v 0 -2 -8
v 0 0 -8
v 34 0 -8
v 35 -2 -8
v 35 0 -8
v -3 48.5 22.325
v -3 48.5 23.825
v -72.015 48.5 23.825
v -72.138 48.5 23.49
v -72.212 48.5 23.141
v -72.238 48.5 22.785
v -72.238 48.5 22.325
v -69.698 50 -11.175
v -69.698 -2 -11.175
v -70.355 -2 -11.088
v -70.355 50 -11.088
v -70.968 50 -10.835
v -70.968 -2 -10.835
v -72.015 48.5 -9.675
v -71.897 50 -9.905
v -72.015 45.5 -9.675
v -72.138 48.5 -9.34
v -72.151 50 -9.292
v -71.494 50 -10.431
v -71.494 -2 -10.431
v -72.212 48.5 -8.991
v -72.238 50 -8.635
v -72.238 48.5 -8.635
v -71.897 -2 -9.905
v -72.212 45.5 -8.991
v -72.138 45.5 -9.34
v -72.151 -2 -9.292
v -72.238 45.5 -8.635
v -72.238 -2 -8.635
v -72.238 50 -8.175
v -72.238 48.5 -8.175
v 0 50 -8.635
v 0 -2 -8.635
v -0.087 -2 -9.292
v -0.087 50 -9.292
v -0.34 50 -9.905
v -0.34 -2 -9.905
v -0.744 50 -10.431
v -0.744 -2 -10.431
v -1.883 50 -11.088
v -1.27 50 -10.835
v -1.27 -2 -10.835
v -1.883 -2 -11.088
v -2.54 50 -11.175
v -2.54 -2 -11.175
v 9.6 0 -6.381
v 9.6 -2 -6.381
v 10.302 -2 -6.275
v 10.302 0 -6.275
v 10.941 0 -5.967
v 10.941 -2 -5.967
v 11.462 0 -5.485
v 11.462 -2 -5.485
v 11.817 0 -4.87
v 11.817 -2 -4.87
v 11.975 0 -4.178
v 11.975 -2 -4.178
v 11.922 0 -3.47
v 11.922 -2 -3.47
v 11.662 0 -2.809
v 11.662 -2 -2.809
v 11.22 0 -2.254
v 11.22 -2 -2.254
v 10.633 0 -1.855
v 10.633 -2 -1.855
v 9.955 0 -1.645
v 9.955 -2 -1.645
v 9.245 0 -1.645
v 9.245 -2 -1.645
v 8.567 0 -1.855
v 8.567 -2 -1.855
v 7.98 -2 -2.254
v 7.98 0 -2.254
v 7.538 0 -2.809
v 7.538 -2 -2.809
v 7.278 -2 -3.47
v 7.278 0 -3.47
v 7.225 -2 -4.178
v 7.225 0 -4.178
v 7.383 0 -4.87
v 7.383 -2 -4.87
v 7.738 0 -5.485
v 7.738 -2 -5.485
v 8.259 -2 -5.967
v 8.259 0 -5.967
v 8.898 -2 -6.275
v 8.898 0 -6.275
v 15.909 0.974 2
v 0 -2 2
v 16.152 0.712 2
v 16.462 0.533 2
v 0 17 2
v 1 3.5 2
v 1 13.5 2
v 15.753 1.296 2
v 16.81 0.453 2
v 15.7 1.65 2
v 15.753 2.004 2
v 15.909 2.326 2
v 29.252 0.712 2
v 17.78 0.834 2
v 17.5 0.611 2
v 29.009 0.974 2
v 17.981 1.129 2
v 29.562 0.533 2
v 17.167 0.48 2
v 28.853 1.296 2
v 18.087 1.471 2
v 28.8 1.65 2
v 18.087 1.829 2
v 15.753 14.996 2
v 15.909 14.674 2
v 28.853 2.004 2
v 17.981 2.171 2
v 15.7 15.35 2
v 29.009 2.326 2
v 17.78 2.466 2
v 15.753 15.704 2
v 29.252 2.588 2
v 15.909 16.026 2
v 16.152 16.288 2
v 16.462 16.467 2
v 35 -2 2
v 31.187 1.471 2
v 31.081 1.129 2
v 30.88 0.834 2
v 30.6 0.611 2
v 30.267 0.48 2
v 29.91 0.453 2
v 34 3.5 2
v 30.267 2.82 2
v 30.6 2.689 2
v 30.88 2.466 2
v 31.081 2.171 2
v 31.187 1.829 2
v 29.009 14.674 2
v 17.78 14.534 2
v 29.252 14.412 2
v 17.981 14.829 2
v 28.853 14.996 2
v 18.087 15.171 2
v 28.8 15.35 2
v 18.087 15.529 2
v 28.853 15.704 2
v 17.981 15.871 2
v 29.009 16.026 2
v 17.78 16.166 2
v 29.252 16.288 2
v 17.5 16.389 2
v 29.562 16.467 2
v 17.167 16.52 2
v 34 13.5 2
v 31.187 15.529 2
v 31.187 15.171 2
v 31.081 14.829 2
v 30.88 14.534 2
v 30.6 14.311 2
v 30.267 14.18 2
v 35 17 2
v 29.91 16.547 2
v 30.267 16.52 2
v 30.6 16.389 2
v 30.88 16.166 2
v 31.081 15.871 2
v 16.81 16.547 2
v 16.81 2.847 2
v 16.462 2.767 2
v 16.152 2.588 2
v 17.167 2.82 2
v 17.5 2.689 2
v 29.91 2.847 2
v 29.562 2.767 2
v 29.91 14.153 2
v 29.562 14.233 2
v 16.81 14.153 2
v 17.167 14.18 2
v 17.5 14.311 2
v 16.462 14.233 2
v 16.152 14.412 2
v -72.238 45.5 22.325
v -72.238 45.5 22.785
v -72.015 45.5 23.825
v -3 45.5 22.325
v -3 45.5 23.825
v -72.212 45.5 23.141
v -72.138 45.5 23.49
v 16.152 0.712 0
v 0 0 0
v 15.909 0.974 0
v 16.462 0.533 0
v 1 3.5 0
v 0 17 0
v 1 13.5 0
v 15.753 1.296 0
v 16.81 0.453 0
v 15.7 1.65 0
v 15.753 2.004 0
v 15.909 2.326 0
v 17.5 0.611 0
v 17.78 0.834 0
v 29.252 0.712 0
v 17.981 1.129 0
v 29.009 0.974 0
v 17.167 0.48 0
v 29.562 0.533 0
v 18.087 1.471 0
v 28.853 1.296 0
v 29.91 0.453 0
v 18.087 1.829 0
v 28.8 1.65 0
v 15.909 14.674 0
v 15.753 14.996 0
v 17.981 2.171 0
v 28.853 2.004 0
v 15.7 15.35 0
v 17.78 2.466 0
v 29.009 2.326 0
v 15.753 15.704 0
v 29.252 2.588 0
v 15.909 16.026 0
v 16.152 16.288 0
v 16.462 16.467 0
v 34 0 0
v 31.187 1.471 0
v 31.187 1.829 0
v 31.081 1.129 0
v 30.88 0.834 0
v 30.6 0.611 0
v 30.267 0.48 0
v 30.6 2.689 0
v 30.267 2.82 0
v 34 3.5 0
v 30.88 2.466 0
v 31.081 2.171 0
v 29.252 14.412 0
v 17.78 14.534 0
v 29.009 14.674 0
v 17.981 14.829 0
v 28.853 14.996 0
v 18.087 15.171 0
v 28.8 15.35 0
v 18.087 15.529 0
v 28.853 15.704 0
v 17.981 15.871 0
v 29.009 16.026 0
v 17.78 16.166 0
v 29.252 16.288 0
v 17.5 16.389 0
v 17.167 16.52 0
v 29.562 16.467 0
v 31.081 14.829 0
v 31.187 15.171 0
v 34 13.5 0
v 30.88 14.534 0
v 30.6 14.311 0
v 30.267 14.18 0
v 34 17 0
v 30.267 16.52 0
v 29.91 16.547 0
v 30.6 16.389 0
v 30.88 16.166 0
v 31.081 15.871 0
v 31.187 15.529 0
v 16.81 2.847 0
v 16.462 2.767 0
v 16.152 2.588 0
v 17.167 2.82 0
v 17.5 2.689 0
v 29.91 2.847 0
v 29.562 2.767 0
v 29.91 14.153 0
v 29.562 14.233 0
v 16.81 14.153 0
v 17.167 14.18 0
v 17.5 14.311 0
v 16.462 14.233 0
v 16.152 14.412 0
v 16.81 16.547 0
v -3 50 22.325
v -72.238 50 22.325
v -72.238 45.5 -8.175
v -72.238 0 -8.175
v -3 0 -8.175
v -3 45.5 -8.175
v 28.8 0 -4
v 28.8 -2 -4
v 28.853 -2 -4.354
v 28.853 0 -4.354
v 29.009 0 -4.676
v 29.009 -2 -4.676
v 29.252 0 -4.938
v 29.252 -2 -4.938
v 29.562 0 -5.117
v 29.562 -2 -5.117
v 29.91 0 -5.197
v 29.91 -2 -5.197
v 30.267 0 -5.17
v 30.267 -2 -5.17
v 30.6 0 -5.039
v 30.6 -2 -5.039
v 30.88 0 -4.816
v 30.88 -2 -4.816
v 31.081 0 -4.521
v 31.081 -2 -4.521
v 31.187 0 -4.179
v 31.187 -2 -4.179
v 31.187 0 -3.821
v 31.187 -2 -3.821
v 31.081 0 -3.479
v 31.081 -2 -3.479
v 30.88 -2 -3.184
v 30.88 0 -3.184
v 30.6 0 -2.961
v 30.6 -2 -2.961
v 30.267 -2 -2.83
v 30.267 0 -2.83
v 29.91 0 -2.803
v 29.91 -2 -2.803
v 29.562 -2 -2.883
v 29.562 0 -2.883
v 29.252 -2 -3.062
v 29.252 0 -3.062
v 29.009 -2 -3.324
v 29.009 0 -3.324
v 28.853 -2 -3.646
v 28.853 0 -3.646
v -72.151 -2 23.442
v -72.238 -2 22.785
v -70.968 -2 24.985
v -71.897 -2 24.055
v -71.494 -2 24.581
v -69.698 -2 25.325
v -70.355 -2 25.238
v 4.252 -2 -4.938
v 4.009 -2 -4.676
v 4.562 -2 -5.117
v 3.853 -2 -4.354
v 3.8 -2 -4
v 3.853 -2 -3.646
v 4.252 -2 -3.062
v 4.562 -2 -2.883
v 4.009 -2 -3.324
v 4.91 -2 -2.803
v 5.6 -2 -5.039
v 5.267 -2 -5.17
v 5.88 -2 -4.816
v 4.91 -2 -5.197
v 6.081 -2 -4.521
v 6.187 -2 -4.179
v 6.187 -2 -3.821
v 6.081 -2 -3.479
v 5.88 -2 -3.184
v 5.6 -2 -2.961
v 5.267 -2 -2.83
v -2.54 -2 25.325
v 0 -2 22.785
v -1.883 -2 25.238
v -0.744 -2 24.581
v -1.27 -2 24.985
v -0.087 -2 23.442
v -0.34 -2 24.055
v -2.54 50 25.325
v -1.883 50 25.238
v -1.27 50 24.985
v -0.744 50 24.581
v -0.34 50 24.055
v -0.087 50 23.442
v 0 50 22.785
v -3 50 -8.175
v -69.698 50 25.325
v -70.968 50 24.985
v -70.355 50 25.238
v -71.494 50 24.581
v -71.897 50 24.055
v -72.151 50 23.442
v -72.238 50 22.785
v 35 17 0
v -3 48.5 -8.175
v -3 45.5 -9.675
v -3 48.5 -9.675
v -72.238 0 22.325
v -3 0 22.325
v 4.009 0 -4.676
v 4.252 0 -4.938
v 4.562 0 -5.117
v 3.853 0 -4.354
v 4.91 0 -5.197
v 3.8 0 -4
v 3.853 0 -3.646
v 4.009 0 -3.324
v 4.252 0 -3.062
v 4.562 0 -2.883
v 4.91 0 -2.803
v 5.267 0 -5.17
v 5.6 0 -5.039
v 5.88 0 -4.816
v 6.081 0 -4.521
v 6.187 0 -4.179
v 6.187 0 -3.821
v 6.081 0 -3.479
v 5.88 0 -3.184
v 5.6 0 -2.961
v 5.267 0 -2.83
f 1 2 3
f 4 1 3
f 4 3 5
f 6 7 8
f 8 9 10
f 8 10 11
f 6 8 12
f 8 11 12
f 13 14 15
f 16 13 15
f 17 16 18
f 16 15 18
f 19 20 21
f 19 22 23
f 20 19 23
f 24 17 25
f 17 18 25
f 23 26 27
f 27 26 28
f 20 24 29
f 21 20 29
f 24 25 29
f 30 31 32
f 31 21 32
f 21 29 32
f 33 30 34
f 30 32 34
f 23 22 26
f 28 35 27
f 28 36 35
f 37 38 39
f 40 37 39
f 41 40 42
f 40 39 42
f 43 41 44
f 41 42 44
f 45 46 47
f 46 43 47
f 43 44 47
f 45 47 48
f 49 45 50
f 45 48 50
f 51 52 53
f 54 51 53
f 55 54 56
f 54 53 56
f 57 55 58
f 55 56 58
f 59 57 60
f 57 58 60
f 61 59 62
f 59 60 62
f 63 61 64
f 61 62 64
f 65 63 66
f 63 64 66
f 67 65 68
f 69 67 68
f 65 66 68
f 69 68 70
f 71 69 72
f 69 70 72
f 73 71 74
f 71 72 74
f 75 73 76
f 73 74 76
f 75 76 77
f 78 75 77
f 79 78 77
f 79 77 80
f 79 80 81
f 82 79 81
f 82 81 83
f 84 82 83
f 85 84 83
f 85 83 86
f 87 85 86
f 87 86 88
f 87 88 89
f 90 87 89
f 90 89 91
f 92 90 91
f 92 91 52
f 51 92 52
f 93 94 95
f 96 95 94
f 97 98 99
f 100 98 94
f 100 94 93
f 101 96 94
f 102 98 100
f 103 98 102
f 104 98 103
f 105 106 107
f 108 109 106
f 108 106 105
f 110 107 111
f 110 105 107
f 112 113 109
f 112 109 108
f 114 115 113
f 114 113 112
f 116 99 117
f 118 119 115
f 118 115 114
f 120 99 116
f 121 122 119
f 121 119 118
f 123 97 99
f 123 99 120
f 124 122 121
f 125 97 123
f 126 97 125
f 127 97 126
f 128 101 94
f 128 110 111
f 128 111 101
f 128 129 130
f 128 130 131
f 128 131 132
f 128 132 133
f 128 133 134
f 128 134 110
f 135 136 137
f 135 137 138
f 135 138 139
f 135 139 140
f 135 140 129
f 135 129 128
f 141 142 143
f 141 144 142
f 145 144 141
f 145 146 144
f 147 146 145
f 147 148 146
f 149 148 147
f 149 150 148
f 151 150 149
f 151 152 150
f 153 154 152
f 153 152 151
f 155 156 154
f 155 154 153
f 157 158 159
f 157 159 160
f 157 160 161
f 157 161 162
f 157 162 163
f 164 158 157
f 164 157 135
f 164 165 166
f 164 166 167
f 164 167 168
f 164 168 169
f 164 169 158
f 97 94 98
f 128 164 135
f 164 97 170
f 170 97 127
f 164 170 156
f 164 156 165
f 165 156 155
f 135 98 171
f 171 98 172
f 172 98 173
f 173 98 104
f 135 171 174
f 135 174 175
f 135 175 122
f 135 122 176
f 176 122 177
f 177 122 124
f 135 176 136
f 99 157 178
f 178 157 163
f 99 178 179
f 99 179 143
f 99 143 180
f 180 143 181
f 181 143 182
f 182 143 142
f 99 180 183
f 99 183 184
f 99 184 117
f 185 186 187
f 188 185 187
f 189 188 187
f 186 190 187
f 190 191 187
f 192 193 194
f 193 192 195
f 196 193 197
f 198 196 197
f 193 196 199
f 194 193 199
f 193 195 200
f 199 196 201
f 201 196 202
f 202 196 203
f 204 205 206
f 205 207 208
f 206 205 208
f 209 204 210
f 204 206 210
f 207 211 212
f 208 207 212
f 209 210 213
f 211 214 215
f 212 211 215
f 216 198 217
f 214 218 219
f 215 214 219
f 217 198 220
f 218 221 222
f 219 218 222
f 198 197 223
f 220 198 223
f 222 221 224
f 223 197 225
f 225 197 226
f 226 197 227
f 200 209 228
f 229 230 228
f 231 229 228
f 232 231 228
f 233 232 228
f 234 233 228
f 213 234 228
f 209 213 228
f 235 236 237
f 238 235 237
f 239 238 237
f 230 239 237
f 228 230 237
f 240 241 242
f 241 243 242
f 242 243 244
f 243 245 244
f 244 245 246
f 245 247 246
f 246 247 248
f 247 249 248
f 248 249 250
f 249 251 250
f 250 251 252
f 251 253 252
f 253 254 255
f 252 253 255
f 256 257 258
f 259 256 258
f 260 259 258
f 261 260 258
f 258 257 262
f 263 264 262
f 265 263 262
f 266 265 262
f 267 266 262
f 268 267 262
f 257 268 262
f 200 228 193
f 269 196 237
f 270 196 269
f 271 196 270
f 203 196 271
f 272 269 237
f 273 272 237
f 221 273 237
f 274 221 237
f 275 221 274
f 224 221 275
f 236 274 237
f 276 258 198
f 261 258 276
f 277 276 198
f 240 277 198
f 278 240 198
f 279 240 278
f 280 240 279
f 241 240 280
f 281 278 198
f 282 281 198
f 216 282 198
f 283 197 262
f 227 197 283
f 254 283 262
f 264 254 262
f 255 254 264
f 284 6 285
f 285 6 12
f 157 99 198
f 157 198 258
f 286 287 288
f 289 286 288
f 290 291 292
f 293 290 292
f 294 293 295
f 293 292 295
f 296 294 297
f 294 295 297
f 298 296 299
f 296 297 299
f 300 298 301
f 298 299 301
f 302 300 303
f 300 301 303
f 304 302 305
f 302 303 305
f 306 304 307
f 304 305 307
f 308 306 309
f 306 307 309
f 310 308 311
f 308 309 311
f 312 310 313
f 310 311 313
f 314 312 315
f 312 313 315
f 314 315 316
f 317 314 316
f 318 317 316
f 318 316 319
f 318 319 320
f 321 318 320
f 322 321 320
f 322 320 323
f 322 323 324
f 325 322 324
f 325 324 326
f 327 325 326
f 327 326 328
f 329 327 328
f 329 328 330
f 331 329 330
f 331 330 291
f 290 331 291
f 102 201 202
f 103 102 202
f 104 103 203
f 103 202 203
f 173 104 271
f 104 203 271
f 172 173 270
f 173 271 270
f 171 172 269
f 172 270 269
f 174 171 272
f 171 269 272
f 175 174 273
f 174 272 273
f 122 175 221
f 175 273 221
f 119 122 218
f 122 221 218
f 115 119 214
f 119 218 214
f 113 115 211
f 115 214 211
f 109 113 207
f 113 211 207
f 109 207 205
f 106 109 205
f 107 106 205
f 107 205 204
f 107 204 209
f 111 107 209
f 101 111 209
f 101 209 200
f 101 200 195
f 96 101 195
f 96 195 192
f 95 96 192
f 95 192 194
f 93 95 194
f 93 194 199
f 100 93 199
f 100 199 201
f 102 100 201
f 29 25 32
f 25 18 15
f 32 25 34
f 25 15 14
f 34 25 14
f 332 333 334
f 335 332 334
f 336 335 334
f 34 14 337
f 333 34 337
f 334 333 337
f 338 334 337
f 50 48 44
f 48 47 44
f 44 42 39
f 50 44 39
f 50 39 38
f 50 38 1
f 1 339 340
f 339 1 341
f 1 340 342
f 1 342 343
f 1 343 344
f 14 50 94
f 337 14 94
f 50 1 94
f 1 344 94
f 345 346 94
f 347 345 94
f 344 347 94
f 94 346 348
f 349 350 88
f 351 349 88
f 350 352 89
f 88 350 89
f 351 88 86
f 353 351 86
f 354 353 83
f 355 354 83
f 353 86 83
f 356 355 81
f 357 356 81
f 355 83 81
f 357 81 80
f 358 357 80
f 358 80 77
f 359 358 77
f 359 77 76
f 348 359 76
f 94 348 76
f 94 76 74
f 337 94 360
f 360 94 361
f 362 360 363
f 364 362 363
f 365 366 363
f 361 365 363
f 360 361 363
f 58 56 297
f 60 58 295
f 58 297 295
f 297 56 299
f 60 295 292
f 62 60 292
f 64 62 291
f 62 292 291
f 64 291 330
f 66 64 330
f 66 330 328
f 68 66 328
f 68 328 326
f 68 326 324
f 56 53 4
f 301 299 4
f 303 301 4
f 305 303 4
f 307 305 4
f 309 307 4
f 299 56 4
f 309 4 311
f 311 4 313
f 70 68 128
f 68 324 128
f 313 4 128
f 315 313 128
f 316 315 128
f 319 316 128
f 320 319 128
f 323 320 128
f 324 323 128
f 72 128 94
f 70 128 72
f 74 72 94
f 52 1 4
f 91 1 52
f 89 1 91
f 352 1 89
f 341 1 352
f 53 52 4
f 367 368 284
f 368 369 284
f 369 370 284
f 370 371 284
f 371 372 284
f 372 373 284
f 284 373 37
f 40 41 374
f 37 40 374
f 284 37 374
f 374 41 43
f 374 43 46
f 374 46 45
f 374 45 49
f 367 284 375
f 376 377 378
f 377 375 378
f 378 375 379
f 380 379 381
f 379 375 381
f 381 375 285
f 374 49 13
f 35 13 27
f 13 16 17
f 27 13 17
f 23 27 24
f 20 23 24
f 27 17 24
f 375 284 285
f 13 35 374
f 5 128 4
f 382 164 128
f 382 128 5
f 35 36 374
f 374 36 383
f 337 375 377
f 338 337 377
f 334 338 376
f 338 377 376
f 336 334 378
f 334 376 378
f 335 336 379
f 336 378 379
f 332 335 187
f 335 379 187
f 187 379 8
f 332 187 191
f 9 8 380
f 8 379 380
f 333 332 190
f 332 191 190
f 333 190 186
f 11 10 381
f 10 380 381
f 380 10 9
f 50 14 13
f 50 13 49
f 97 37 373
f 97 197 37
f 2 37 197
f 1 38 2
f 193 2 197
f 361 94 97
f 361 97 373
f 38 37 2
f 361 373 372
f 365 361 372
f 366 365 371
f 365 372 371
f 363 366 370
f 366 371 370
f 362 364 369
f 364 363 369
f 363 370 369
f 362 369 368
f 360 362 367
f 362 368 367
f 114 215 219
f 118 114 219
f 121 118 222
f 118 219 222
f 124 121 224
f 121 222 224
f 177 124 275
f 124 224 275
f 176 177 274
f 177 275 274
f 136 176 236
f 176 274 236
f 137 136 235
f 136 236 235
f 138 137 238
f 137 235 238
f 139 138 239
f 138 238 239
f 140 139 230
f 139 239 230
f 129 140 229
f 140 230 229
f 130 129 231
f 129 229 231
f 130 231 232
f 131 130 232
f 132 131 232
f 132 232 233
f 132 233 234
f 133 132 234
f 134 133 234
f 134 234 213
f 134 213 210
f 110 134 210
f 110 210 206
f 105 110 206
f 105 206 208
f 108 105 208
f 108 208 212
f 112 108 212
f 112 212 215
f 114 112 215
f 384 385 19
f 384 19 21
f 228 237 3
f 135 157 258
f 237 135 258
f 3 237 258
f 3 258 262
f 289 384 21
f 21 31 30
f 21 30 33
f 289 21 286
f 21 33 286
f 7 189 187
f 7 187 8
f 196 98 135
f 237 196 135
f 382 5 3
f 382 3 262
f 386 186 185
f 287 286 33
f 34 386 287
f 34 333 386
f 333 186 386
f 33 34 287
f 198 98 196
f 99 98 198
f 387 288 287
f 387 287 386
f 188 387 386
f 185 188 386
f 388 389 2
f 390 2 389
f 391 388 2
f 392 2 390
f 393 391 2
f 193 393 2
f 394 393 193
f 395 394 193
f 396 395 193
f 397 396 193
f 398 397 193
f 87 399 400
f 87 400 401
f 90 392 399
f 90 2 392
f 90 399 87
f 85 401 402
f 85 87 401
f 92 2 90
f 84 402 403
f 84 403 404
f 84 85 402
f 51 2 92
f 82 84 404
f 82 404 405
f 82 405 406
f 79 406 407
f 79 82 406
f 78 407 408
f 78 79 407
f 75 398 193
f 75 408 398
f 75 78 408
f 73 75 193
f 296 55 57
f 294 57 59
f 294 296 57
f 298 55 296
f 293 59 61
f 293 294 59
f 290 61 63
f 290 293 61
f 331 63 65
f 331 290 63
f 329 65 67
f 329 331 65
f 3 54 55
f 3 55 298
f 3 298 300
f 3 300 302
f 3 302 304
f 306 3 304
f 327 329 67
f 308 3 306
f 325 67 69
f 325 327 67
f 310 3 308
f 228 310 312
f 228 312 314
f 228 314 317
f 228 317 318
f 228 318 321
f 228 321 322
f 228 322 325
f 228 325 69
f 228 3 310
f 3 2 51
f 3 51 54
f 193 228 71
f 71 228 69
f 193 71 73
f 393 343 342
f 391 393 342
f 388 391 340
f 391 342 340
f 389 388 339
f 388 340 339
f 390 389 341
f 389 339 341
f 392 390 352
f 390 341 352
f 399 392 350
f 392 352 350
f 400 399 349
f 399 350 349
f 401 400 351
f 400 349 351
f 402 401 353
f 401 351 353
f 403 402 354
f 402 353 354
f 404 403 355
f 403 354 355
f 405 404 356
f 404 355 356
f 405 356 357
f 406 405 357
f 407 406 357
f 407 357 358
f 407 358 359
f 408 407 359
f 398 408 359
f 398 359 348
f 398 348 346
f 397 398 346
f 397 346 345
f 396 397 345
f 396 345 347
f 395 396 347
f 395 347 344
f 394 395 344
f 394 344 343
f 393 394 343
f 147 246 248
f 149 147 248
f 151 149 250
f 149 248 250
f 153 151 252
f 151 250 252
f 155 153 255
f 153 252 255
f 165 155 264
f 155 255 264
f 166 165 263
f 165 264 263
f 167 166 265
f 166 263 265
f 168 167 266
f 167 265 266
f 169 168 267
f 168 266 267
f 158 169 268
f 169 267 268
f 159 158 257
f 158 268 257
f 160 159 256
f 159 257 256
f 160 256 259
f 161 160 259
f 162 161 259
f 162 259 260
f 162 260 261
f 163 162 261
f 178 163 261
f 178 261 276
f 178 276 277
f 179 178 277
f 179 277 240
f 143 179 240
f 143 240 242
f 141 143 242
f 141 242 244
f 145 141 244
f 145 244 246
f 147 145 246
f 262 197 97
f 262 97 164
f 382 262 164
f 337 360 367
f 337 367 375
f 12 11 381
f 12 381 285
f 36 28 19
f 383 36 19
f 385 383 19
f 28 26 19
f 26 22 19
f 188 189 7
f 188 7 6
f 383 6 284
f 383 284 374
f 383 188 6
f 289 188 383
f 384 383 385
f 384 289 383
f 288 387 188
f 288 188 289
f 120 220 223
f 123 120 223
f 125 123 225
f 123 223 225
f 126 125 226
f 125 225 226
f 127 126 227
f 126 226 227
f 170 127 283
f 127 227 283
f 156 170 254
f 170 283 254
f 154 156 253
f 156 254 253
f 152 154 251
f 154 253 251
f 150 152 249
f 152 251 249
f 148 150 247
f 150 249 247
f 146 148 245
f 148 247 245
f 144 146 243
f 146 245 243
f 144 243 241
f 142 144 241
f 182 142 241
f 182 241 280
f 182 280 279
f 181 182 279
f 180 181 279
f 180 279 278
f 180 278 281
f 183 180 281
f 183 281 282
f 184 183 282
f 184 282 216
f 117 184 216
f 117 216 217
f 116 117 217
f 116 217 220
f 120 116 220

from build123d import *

# Parameters (mm, degrees)
SKETCH1_W            = 35
SKETCH1_H            = 17
BOSS_EXTRUDE1_DEPTH  = 2
M2_CLEARANCE_HOLE1_D = 2.4
SKETCH6_W            = 35
SKETCH6_H            = 10
BOSS_EXTRUDE2_DEPTH  = 2
SKETCH7_W            = 33
SKETCH7_H            = 10
CUT_EXTRUDE1_DEPTH   = 41.174618853
M2_CLEARANCE_HOLE2_D = 2.4
SKETCH10_W           = 36.5
SKETCH10_H           = 2
BOSS_EXTRUDE3_DEPTH  = 72.237500028
BOSS_EXTRUDE4_DEPTH  = 50
CUT_EXTRUDE2_DEPTH   = 69.237500028
BOSS_EXTRUDE5_DEPTH  = 1
FILLET1_R            = 2.54
SKETCH15_R           = 2.38125
CUT_EXTRUDE3_DEPTH   = 93.539786229


with BuildPart() as part:
    # Sketch1 → Boss-Extrude1 (new body)
    with BuildSketch(Plane.XY):
        with Locations((17.5, 8.5)):
            Rectangle(SKETCH1_W, SKETCH1_H)
    extrude(amount=BOSS_EXTRUDE1_DEPTH)

    # M2 Clearance Hole1 (through all)
    with Locations(Plane.XY.offset(2)):
        with Locations((16.9, 15.35), (30, 15.35), (30, 1.65), (16.9, 1.65)):
            Hole(M2_CLEARANCE_HOLE1_D / 2)

    # Sketch6 → Boss-Extrude2 (add)
    with BuildSketch(Plane.XZ):
        with Locations((17.5, -3)):
            Rectangle(SKETCH6_W, SKETCH6_H)
    extrude(amount=BOSS_EXTRUDE2_DEPTH)

    # Sketch7 → Cut-Extrude1 (cut, through all)
    with BuildSketch(Plane.XY.offset(2)):
        with Locations((17.5, 8.5)):
            Rectangle(SKETCH7_W, SKETCH7_H)
    extrude(amount=-CUT_EXTRUDE1_DEPTH, mode=Mode.SUBTRACT)

    # M2 Clearance Hole2 (through all)
    with Locations(Plane(origin=(0, 0, 0), x_dir=(1, 0, 0), z_dir=(0, 1, 0))):
        with Locations((30, 4), (5, 4)):
            Hole(M2_CLEARANCE_HOLE2_D / 2)

    # Sketch10 → Boss-Extrude3 (add)
    with BuildSketch(Plane.ZY):
        with Locations((7.075, -1)):
            Rectangle(SKETCH10_W, SKETCH10_H)
    extrude(amount=BOSS_EXTRUDE3_DEPTH)

    # Sketch11 → Boss-Extrude4 (add)
    with BuildSketch(Plane(origin=(0, 0, 0), x_dir=(1, 0, 0), z_dir=(0, 1, 0))):
        Polygon((0, -25.325), (-72.237500028, -25.325), (-72.237500028, -22.325), (-69.237500028, -22.325), (-3, -22.325), (-3, 8.175), (-69.237500028, 8.175), (-72.237500028, 8.175), (-72.237500028, 11.175), (0, 11.175), align=None)
    extrude(amount=BOSS_EXTRUDE4_DEPTH)

    # Sketch12 → Cut-Extrude2 (cut)
    with BuildSketch(Plane.ZY.offset(72.237500028)):
        Polygon((23.825, 48.5), (22.325, 48.5), (-8.175, 48.5), (-9.675, 48.5), (-9.675, 45.5), (-8.175, 45.5), (22.325, 45.5), (23.825, 45.5), align=None)
    extrude(amount=-CUT_EXTRUDE2_DEPTH, mode=Mode.SUBTRACT)

    # Sketch14 → Boss-Extrude5 (add)
    with BuildSketch(Plane(origin=(35, 0, 0), x_dir=(0, 0, -1), z_dir=(1, 0, 0))):
        Polygon((8, 0), (0, 17), (0, 0), align=None)
    extrude(amount=-BOSS_EXTRUDE5_DEPTH)

    # Fillet1
    # the kernel refuses this fillet: 2.54 mm, written as the material it takes off along each edge
    with BuildSketch(Plane(origin=(0, 56.35, 25.325), x_dir=(0, 0, -1), z_dir=(0, -1, 0)), Plane(origin=(-72.237500028, 56.35, 25.325), x_dir=(1, 0, 0), z_dir=(0, -1, 0)), Plane(origin=(-72.237500028, -8.35, -11.175), x_dir=(1, 0, 0), z_dir=(0, 1, 0)), Plane(origin=(0, -8.35, -11.175), x_dir=(0, 0, 1), z_dir=(0, 1, 0))) as fillet1_piece_1:
        with BuildLine():
            CenterArc((FILLET1_R, -FILLET1_R), FILLET1_R, 90, 90)
            Line((0, -FILLET1_R), (0, 0))
            Line((0, 0), (FILLET1_R, 0))
        make_face()
    extrude(amount=64.7, mode=Mode.SUBTRACT)

    # Sketch15 → Cut-Extrude3 (cut, through all)
    with BuildSketch(Plane.XZ.offset(2)):
        with Locations(Location((9.6, -4, 0), (0, 0, 270))):
            Circle(SKETCH15_R)
    extrude(amount=-CUT_EXTRUDE3_DEPTH, mode=Mode.SUBTRACT)


solid = part.part
